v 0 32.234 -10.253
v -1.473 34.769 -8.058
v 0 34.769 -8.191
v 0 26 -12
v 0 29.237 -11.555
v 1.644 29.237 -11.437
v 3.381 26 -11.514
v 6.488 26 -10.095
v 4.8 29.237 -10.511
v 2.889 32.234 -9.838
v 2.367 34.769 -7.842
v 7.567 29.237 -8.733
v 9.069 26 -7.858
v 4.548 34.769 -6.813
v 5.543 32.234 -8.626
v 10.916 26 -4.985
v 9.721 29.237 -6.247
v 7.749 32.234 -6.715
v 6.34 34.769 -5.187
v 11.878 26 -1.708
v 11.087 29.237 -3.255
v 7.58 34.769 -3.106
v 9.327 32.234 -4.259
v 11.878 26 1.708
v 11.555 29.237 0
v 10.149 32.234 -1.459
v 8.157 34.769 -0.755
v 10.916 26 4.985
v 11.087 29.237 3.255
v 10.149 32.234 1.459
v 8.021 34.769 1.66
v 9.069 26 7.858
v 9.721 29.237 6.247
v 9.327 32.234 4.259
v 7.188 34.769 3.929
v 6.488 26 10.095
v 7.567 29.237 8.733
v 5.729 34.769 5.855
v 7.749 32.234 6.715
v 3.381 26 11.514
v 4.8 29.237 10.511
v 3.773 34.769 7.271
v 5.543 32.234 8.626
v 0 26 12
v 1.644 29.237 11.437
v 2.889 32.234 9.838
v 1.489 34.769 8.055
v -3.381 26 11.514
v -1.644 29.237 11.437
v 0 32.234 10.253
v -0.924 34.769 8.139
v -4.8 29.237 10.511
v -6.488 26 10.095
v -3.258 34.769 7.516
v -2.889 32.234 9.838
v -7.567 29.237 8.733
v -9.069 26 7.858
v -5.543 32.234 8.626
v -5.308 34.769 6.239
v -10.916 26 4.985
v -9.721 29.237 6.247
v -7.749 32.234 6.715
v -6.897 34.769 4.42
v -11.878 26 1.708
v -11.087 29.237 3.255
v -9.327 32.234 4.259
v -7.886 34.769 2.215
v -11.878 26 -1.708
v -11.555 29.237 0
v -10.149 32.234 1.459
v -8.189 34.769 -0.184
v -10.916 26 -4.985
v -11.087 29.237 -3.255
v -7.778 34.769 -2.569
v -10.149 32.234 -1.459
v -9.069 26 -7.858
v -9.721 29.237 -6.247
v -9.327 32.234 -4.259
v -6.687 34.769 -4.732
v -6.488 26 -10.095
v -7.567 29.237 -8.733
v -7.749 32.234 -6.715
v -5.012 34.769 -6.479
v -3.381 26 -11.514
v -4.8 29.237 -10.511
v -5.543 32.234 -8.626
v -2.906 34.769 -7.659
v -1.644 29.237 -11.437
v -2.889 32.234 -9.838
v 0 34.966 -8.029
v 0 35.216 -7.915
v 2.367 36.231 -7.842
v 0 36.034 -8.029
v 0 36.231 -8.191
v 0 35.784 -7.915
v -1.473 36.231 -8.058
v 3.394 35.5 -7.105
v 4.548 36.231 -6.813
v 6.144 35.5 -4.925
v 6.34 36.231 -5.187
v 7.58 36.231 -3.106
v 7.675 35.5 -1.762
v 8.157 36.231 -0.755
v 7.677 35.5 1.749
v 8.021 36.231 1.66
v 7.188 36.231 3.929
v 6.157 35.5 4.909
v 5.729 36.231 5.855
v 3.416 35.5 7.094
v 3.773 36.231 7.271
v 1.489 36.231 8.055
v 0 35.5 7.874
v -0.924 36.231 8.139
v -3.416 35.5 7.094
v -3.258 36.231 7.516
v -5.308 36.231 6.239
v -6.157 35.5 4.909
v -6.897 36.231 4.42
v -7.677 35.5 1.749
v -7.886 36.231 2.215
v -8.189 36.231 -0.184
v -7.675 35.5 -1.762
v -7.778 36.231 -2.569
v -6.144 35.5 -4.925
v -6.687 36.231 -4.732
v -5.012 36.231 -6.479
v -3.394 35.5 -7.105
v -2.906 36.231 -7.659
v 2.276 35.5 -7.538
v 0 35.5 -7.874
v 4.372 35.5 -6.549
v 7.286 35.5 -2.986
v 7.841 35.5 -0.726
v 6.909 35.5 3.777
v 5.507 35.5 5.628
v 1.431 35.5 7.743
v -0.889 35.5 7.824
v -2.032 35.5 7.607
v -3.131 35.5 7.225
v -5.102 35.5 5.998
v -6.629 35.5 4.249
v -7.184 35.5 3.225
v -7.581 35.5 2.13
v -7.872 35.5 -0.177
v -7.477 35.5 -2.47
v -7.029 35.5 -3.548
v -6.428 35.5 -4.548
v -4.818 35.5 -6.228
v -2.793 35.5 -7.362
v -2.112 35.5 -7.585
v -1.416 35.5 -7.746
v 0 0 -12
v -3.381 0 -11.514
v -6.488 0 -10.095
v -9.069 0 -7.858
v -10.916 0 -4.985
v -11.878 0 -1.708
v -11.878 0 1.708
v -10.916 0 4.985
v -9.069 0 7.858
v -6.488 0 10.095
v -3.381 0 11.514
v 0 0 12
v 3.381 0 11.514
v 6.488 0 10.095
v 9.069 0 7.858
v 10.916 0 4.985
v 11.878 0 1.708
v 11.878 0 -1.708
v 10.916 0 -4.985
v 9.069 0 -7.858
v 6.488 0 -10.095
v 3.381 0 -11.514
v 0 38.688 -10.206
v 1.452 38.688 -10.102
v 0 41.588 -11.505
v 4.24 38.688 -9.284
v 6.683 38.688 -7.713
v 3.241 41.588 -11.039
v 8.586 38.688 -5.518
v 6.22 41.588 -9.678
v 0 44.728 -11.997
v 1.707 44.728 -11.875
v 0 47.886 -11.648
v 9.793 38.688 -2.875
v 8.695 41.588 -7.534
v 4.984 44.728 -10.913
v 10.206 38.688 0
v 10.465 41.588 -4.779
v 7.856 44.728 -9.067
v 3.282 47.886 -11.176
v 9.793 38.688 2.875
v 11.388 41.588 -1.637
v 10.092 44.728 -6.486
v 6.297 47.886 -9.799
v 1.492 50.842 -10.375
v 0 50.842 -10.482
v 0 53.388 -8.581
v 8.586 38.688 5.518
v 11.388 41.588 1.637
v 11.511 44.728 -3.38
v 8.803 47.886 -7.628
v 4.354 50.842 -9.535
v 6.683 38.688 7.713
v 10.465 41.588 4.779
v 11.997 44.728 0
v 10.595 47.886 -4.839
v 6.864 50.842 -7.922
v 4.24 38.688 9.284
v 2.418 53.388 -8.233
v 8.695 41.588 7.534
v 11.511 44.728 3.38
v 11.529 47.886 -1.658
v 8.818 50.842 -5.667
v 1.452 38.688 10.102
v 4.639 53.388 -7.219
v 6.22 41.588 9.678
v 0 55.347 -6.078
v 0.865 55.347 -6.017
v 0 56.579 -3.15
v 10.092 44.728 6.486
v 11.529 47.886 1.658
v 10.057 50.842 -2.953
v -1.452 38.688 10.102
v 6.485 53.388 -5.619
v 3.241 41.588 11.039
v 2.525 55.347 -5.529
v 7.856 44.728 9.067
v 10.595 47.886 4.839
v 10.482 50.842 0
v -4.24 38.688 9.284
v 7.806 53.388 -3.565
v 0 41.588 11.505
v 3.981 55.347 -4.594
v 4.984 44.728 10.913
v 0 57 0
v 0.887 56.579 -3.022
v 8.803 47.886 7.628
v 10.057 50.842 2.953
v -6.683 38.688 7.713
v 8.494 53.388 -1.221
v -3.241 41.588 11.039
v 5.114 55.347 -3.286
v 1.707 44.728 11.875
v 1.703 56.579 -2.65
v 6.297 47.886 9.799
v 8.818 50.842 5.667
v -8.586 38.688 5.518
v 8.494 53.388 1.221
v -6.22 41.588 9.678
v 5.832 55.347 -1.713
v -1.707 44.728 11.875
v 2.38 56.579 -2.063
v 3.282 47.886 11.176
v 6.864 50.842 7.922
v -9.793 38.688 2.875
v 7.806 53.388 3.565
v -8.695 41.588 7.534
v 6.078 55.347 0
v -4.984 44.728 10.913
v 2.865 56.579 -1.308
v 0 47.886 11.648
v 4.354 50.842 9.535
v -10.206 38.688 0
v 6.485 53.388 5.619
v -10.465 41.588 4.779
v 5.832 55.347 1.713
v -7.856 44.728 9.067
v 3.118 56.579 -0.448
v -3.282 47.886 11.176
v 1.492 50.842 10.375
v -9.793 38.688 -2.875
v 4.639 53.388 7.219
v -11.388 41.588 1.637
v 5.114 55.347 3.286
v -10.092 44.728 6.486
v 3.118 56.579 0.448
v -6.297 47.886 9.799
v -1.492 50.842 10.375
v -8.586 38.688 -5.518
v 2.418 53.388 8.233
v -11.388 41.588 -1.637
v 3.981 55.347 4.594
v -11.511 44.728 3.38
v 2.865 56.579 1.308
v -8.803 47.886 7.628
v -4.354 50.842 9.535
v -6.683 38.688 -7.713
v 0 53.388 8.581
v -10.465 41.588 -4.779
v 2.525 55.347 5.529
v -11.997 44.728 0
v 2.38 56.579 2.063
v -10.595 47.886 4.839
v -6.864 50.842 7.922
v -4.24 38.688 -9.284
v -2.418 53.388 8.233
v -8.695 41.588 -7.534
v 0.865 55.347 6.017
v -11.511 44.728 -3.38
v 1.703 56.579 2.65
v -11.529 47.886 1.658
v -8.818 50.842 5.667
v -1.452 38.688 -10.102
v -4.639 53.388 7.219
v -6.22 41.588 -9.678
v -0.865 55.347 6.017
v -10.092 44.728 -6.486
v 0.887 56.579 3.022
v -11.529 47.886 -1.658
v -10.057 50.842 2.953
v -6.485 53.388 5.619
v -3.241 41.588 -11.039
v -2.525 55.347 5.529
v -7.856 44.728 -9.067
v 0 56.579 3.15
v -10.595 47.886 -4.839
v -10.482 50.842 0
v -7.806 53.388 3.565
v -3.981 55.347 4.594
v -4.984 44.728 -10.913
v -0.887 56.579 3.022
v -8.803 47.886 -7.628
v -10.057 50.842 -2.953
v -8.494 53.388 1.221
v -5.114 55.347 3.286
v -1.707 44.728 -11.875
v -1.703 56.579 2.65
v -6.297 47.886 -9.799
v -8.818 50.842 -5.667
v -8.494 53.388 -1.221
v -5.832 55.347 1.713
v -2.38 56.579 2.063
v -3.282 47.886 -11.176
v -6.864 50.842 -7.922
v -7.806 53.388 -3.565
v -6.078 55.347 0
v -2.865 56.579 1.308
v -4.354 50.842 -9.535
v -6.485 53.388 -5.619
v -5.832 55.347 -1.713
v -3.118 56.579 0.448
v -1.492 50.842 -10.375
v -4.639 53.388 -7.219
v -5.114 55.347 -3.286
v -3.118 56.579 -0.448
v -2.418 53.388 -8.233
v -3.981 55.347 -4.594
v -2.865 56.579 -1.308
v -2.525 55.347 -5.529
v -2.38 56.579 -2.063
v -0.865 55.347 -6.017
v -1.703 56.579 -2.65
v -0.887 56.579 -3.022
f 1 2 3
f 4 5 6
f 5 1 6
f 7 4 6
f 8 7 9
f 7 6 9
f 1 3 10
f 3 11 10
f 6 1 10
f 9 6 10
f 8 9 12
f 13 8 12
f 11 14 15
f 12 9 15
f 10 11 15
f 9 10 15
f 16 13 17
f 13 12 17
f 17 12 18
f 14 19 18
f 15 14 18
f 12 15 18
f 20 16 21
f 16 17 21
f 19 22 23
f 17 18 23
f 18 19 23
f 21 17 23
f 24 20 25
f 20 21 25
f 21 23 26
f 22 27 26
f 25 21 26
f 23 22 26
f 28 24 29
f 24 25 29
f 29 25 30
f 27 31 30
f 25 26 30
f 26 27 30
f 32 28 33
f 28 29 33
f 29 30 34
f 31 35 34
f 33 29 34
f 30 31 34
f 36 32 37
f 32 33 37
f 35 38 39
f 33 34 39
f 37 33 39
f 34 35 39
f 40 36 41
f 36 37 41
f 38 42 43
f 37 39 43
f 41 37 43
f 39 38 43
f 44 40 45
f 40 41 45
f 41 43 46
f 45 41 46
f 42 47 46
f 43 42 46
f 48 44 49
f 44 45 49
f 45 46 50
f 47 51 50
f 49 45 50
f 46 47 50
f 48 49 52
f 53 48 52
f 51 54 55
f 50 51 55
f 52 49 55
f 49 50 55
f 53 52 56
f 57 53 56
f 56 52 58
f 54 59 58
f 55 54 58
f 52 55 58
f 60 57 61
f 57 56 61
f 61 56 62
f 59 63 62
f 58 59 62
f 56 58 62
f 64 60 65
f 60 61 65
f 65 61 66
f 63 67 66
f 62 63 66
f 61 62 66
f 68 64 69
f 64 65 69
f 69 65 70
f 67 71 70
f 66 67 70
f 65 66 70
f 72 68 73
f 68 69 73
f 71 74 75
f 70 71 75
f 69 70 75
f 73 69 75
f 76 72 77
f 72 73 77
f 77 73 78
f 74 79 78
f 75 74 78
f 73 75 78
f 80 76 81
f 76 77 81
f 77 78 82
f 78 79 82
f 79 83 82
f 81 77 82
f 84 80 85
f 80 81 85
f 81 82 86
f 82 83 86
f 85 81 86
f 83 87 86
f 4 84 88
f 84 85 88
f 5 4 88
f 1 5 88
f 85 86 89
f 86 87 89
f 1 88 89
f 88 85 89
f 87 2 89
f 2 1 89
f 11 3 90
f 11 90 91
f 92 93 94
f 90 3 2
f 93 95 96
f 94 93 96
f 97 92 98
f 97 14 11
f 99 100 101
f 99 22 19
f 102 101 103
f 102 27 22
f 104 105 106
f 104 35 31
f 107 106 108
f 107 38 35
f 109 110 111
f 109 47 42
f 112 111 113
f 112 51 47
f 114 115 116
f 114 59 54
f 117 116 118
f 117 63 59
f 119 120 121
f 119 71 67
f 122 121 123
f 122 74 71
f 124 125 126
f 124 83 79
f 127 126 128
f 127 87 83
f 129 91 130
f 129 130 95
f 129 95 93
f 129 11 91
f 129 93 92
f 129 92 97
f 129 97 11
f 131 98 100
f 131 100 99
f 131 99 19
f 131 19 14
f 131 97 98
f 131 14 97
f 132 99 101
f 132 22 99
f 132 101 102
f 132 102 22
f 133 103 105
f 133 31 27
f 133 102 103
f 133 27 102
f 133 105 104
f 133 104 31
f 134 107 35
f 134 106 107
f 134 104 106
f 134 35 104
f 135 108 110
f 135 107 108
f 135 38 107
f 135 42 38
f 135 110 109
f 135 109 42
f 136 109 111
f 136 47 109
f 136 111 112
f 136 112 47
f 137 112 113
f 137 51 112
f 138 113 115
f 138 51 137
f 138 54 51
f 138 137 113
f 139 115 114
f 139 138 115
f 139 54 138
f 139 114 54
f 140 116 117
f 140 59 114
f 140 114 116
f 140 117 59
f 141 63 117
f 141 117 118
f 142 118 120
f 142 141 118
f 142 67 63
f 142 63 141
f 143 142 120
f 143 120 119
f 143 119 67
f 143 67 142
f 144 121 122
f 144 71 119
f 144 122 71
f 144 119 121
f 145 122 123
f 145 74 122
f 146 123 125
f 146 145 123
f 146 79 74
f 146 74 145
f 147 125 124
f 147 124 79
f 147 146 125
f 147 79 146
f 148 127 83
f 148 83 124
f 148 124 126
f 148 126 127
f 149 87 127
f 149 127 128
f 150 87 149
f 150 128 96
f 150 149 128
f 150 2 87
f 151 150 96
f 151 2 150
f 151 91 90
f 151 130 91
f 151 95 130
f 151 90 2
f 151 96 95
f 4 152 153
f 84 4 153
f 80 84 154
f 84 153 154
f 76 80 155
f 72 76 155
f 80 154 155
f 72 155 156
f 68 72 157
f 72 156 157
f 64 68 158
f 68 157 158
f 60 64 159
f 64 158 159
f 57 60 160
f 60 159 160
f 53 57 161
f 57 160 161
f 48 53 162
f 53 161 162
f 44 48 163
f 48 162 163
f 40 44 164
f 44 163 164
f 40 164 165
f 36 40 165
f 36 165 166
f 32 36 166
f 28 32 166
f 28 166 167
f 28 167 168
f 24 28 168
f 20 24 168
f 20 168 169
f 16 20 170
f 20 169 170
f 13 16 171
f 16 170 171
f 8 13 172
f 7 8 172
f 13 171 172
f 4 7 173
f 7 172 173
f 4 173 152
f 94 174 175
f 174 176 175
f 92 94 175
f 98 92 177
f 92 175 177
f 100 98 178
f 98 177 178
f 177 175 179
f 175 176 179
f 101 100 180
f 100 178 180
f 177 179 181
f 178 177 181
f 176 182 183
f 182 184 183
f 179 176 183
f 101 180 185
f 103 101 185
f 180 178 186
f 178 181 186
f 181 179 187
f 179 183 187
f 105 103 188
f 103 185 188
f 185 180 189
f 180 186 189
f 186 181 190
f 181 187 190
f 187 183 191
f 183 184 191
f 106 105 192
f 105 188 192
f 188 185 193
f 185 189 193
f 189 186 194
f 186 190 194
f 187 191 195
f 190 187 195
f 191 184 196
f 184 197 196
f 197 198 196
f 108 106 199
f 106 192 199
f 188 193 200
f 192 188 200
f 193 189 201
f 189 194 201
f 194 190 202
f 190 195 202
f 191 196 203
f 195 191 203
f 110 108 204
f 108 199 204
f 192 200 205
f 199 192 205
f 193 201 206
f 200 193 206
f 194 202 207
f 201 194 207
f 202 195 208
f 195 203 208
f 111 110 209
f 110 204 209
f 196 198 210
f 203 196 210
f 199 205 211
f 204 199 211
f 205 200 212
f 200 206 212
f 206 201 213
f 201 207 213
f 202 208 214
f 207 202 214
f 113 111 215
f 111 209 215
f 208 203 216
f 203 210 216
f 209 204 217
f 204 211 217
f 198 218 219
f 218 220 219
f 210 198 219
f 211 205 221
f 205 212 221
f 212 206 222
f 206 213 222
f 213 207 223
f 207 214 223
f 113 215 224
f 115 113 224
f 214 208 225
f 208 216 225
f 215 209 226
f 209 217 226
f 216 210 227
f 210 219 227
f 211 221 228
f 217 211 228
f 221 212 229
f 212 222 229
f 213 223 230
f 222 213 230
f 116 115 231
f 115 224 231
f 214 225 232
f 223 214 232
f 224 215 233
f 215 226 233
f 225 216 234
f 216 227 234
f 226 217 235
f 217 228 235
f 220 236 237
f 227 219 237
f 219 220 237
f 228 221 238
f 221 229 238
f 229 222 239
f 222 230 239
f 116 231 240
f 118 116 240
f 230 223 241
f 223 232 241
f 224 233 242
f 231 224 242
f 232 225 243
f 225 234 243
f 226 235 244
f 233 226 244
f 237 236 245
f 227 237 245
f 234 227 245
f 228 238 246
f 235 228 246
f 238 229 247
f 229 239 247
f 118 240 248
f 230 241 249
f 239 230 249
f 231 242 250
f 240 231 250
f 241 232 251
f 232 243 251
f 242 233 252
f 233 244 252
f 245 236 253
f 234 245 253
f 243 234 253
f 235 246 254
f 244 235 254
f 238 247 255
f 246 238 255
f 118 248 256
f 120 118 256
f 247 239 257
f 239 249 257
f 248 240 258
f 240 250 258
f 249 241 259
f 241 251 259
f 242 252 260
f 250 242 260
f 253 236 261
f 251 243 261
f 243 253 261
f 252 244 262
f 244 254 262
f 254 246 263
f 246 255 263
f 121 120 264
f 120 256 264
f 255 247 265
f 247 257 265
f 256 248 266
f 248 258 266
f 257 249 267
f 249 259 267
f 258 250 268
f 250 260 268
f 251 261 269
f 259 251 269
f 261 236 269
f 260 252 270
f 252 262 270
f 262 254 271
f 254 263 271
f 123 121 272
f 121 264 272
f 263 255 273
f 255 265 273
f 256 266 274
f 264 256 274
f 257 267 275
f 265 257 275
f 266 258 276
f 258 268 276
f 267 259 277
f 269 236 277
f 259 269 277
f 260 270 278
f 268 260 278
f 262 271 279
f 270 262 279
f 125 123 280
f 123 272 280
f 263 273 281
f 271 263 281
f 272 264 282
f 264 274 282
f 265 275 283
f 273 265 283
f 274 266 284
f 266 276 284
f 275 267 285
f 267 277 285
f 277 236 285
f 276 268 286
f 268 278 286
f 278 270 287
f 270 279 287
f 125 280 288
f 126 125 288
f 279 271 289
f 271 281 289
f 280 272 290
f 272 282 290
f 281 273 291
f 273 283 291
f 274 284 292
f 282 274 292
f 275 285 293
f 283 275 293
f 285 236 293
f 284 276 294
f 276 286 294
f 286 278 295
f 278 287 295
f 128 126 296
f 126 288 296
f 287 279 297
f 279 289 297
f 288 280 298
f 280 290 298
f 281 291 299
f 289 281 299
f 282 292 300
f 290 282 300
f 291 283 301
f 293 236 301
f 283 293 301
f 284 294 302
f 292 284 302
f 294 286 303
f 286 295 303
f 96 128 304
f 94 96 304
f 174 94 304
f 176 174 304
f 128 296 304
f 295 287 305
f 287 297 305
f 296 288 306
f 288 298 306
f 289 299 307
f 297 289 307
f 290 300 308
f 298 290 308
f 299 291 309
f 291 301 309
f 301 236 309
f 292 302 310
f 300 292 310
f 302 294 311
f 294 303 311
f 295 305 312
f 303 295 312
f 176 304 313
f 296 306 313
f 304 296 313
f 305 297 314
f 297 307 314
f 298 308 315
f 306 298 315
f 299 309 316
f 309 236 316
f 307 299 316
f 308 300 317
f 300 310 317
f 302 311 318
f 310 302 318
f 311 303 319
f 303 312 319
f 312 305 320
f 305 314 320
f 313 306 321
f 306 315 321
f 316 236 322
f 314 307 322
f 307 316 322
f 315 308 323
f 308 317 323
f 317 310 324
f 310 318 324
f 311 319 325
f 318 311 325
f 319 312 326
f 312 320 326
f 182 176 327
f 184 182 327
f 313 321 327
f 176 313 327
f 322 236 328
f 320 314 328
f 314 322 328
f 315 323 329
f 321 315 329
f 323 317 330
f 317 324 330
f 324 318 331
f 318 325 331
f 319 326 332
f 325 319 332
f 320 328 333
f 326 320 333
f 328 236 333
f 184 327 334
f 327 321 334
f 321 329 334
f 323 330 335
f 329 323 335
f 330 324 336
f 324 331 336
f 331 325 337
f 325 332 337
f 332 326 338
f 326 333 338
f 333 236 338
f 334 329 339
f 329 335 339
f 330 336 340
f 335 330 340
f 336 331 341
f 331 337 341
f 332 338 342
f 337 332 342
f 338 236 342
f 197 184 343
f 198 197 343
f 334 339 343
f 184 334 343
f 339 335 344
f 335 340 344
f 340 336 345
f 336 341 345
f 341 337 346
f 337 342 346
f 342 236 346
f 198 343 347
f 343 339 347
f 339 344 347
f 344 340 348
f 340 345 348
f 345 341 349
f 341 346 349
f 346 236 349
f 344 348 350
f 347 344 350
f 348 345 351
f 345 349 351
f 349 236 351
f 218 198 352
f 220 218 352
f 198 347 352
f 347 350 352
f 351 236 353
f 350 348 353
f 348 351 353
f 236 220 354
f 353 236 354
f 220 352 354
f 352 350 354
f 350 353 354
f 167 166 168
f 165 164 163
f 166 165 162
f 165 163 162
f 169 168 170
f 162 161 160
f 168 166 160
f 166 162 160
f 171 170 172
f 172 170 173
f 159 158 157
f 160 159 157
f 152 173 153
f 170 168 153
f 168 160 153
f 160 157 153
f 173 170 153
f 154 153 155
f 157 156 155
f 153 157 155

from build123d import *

# Parameters (mm, degrees)
SKETCH1_R           = 12
BOSS_EXTRUDE1_DEPTH = 26
FILLET1_R           = 1


with BuildPart() as part:
    # Sketch1 → Boss-Extrude1 (new body)
    with BuildSketch(Plane(origin=(0, 0, 0), x_dir=(1, 0, 0), z_dir=(0, 1, 0))):
        with Locations(Location((0, 0, 0), (0, 0, 90))):
            Circle(SKETCH1_R)
    extrude(amount=BOSS_EXTRUDE1_DEPTH)

    # Sketch2 → Revolve1 (revolve)
    with BuildSketch(Plane.XY, mode=Mode.PRIVATE) as revolve1_sk:
        with BuildLine():
            Line((0, 55.943780463), (0, 26))
            Line((0, 26), (12, 26))
            ThreePointArc((12, 26), (10.76980199, 31.292576415), (7.331439149, 35.5))
            ThreePointArc((7.331439149, 35.5), (11.357816692, 48.872983346), (0, 57))
            Line((0, 57), (0, 55.943780463))
        make_face()
    revolve(revolve1_sk.sketch.rotate(Axis((0, 55.943780463, 0), (0, -1, 0)), 270), axis=Axis((0, 55.943780463, 0), (0, -1, 0)))

    # Fillet1
    fillet1_edges = [part.edges().sort_by_distance(p)[0] for p in [
        (0, 35.5, 7.331439149),
    ]]
    fillet(fillet1_edges, radius=FILLET1_R)


solid = part.part
